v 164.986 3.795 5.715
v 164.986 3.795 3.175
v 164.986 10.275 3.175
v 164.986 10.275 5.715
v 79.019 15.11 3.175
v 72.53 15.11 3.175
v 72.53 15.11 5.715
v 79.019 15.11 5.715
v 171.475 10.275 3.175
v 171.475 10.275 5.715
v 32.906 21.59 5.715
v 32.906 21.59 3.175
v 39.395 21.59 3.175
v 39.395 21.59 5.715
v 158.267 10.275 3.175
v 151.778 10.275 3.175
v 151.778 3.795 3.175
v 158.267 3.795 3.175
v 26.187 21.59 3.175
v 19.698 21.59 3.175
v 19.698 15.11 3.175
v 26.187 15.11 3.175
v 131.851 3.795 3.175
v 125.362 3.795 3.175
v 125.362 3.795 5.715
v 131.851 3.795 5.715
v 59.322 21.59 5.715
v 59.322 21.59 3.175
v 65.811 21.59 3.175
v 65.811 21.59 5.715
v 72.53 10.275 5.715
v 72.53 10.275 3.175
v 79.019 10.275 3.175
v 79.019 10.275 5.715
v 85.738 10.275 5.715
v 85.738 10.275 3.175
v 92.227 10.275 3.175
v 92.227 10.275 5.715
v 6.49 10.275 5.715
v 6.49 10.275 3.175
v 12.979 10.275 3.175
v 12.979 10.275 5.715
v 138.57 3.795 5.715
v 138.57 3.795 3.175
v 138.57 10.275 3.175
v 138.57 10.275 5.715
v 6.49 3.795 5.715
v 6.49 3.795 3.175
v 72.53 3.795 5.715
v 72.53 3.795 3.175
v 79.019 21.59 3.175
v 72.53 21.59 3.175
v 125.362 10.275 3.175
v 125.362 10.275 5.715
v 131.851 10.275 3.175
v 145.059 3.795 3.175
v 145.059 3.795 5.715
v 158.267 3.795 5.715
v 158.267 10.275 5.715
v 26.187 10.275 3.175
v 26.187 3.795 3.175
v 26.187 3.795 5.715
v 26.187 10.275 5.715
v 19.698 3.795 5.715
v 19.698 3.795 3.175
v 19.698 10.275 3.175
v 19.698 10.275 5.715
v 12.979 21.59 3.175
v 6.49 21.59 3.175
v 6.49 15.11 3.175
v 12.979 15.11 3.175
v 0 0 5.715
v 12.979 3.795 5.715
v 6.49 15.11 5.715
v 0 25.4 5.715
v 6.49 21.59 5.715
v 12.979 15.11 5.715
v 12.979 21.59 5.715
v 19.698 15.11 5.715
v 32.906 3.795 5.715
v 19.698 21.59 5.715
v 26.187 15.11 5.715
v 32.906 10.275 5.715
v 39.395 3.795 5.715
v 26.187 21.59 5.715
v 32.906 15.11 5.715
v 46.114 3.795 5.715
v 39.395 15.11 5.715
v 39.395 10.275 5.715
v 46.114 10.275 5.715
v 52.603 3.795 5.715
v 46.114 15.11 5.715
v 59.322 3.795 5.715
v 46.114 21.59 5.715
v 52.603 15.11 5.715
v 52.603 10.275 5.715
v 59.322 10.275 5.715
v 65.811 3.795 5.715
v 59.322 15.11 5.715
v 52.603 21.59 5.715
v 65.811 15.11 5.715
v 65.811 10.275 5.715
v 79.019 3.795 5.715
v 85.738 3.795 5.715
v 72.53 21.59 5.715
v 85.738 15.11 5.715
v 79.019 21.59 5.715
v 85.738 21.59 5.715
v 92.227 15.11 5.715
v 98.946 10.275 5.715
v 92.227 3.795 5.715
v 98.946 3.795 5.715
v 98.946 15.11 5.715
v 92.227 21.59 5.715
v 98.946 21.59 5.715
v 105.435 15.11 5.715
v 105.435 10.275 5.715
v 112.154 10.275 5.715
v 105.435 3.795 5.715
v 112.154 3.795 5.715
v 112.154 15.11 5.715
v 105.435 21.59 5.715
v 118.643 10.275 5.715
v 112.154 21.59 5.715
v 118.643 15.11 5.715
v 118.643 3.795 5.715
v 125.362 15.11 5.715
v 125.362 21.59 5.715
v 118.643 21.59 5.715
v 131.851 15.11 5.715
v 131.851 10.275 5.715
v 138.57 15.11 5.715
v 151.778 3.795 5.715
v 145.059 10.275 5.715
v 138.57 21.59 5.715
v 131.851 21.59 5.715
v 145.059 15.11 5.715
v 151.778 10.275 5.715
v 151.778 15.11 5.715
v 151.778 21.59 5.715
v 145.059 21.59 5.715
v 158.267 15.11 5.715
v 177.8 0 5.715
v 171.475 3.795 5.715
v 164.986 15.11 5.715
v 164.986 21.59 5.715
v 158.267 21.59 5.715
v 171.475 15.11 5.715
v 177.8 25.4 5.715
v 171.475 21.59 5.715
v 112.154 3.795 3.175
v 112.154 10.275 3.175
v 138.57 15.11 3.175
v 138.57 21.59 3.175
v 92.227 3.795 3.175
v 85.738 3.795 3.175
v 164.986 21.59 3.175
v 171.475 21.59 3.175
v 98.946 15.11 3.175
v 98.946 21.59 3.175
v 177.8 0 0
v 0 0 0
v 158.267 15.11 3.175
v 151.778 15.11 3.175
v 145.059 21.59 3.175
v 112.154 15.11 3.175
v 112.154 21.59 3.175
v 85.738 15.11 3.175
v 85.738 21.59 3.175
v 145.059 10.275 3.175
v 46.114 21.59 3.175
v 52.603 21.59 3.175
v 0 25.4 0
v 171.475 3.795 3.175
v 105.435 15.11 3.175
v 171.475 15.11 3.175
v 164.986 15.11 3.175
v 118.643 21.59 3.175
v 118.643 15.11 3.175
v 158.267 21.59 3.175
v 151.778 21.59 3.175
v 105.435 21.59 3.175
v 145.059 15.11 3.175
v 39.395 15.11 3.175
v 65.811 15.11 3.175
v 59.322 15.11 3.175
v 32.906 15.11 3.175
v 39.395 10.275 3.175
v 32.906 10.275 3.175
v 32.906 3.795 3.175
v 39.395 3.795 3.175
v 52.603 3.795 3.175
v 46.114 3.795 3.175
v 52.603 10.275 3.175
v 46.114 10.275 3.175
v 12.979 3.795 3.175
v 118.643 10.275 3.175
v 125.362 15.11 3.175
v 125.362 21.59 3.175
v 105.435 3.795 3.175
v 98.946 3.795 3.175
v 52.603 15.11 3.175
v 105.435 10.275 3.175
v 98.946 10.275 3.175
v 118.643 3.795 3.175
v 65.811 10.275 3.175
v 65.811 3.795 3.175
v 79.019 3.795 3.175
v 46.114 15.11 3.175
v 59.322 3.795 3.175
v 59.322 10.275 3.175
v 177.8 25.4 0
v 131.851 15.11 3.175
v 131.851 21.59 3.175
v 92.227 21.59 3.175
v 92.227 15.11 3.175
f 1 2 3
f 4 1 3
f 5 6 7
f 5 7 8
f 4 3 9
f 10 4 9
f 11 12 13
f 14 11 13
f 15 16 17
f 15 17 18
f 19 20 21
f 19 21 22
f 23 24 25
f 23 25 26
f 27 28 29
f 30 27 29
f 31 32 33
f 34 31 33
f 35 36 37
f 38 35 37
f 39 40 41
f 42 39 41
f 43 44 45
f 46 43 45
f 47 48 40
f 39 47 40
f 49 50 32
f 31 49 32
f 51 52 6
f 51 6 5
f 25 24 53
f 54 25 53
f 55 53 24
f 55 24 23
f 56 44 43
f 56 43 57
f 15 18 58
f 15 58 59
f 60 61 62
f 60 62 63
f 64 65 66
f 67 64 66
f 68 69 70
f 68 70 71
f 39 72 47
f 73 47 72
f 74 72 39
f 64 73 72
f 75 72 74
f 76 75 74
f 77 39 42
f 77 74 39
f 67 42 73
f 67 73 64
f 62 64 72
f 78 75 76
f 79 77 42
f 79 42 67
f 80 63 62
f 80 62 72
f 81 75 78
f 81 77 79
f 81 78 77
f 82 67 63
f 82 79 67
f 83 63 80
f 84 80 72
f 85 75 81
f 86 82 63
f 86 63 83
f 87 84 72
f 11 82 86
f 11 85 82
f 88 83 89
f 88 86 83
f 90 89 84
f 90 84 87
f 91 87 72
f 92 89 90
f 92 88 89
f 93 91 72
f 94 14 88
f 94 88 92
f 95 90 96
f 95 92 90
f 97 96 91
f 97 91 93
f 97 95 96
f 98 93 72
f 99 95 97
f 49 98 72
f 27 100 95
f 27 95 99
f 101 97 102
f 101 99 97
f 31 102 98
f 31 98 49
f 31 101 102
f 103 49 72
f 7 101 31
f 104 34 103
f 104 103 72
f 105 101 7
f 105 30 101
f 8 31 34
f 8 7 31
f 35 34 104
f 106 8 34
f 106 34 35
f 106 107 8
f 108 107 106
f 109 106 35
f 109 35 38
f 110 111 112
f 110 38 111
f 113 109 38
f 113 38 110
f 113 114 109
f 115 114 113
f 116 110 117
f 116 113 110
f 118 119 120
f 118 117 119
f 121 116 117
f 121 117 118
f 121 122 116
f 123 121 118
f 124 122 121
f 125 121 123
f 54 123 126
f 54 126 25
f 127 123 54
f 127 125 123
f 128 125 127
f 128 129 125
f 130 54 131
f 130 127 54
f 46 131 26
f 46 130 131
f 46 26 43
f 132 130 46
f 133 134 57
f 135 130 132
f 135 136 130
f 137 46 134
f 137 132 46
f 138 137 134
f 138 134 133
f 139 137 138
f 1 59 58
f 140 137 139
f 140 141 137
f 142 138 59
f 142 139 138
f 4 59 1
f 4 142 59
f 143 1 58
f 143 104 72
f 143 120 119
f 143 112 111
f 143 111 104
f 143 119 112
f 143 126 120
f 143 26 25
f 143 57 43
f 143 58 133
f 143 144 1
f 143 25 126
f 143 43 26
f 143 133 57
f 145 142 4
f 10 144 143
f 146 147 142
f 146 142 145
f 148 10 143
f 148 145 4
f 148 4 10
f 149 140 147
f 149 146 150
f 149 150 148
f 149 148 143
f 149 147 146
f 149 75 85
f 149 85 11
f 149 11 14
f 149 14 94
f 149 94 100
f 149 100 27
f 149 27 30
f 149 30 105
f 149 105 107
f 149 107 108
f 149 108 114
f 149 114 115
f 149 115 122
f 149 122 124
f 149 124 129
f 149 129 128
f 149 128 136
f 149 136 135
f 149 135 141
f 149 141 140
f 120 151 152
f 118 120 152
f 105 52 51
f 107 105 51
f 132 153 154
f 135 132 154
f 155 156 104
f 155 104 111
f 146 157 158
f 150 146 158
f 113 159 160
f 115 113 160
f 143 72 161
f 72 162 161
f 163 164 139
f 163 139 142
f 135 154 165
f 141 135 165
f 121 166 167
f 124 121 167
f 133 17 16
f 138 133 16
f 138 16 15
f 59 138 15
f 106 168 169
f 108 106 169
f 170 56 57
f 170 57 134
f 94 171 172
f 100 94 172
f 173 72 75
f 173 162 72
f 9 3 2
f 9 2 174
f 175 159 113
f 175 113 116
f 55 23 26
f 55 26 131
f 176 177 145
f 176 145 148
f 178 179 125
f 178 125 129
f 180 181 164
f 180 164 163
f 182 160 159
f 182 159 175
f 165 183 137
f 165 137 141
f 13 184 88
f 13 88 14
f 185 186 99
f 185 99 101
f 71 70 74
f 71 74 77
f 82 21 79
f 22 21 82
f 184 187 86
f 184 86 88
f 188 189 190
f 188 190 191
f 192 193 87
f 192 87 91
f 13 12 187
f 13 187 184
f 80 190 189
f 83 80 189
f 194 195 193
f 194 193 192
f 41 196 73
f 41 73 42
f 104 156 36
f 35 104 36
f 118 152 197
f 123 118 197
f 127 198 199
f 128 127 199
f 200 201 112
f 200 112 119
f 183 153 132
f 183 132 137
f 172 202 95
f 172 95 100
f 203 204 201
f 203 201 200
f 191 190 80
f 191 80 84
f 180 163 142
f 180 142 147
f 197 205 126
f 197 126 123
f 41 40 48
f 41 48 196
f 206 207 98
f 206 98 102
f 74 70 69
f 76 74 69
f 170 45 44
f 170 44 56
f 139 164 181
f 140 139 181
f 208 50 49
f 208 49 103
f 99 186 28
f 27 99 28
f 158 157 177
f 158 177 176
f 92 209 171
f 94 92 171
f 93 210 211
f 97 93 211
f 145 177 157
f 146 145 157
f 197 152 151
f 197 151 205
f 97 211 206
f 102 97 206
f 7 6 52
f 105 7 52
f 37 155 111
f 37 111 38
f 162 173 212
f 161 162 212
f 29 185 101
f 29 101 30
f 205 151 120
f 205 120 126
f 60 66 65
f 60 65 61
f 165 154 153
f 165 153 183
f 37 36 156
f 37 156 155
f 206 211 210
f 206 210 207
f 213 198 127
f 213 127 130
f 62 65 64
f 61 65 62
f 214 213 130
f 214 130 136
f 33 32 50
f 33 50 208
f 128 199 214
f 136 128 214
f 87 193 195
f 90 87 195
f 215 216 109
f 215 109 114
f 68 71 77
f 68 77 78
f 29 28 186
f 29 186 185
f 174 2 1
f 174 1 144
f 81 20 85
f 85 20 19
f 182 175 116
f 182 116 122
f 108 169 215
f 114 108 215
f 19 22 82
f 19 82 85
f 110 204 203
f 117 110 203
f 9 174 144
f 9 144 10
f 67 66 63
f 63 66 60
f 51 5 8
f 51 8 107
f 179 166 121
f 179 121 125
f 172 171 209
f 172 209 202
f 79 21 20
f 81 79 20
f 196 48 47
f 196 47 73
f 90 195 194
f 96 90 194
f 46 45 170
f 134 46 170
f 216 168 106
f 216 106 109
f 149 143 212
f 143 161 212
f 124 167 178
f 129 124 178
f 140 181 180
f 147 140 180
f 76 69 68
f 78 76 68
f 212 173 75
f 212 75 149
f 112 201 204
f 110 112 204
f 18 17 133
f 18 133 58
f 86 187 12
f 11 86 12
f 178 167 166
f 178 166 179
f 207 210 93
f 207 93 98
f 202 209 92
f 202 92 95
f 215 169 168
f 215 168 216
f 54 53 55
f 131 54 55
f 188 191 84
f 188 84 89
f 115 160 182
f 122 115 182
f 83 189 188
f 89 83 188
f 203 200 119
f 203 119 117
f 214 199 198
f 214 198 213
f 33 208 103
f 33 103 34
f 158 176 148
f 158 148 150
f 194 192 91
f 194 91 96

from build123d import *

# Parameters (mm, degrees)
F0_W     = 177.8
F0_H     = 25.4
F1_DEPTH = 3.175
F2_W     = 177.8
F2_H     = 25.4
F2_W_2   = 6.489529
F2_H_2   = 6.479562
F3_DEPTH = 2.54


with BuildPart() as f1:
    # F0 (on Top) → F1 (new body)
    with BuildSketch(Plane.XY):
        with Locations((88.9, 12.7)):
            Rectangle(F0_W, F0_H)
    extrude(amount=F1_DEPTH)

    # F2 (on face) → F3 (join)
    with BuildSketch(Plane.XY.offset(3.175)):
        with Locations((88.9, 12.7)):
            Rectangle(F2_W, F2_H)
        with Locations((9.734293, 7.034986)):
            Rectangle(F2_W_2, F2_H_2, mode=Mode.SUBTRACT)
        with Locations((22.942293, 7.034986)):
            Rectangle(F2_W_2, F2_H_2, mode=Mode.SUBTRACT)
        with Locations((36.150294, 7.034986)):
            Rectangle(F2_W_2, F2_H_2, mode=Mode.SUBTRACT)
        with Locations((49.358294, 7.034986)):
            Rectangle(F2_W_2, F2_H_2, mode=Mode.SUBTRACT)
        with Locations((62.566294, 7.034986)):
            Rectangle(F2_W_2, F2_H_2, mode=Mode.SUBTRACT)
        with Locations((75.774293, 7.034986)):
            Rectangle(F2_W_2, F2_H_2, mode=Mode.SUBTRACT)
        with Locations((88.982293, 7.034986)):
            Rectangle(F2_W_2, F2_H_2, mode=Mode.SUBTRACT)
        with Locations((102.190293, 7.034986)):
            Rectangle(F2_W_2, F2_H_2, mode=Mode.SUBTRACT)
        with Locations((115.398293, 7.034986)):
            Rectangle(F2_W_2, F2_H_2, mode=Mode.SUBTRACT)
        with Locations((128.606293, 7.034986)):
            Rectangle(F2_W_2, F2_H_2, mode=Mode.SUBTRACT)
        with Locations((141.814293, 7.034986)):
            Rectangle(F2_W_2, F2_H_2, mode=Mode.SUBTRACT)
        with Locations((155.022293, 7.034986)):
            Rectangle(F2_W_2, F2_H_2, mode=Mode.SUBTRACT)
        with Locations((168.230293, 7.034986)):
            Rectangle(F2_W_2, F2_H_2, mode=Mode.SUBTRACT)
        with Locations((9.734293, 18.350219)):
            Rectangle(F2_W_2, F2_H_2, mode=Mode.SUBTRACT)
        with Locations((22.942293, 18.350219)):
            Rectangle(F2_W_2, F2_H_2, mode=Mode.SUBTRACT)
        with Locations((36.150294, 18.350219)):
            Rectangle(F2_W_2, F2_H_2, mode=Mode.SUBTRACT)
        with Locations((49.358294, 18.350219)):
            Rectangle(F2_W_2, F2_H_2, mode=Mode.SUBTRACT)
        with Locations((62.566294, 18.350219)):
            Rectangle(F2_W_2, F2_H_2, mode=Mode.SUBTRACT)
        with Locations((75.774293, 18.350219)):
            Rectangle(F2_W_2, F2_H_2, mode=Mode.SUBTRACT)
        with Locations((88.982293, 18.350219)):
            Rectangle(F2_W_2, F2_H_2, mode=Mode.SUBTRACT)
        with Locations((102.190293, 18.350219)):
            Rectangle(F2_W_2, F2_H_2, mode=Mode.SUBTRACT)
        with Locations((115.398293, 18.350219)):
            Rectangle(F2_W_2, F2_H_2, mode=Mode.SUBTRACT)
        with Locations((128.606293, 18.350219)):
            Rectangle(F2_W_2, F2_H_2, mode=Mode.SUBTRACT)
        with Locations((141.814293, 18.350219)):
            Rectangle(F2_W_2, F2_H_2, mode=Mode.SUBTRACT)
        with Locations((155.022293, 18.350219)):
            Rectangle(F2_W_2, F2_H_2, mode=Mode.SUBTRACT)
        with Locations((168.230293, 18.350219)):
            Rectangle(F2_W_2, F2_H_2, mode=Mode.SUBTRACT)
    extrude(amount=F3_DEPTH)


solid = f1.part
